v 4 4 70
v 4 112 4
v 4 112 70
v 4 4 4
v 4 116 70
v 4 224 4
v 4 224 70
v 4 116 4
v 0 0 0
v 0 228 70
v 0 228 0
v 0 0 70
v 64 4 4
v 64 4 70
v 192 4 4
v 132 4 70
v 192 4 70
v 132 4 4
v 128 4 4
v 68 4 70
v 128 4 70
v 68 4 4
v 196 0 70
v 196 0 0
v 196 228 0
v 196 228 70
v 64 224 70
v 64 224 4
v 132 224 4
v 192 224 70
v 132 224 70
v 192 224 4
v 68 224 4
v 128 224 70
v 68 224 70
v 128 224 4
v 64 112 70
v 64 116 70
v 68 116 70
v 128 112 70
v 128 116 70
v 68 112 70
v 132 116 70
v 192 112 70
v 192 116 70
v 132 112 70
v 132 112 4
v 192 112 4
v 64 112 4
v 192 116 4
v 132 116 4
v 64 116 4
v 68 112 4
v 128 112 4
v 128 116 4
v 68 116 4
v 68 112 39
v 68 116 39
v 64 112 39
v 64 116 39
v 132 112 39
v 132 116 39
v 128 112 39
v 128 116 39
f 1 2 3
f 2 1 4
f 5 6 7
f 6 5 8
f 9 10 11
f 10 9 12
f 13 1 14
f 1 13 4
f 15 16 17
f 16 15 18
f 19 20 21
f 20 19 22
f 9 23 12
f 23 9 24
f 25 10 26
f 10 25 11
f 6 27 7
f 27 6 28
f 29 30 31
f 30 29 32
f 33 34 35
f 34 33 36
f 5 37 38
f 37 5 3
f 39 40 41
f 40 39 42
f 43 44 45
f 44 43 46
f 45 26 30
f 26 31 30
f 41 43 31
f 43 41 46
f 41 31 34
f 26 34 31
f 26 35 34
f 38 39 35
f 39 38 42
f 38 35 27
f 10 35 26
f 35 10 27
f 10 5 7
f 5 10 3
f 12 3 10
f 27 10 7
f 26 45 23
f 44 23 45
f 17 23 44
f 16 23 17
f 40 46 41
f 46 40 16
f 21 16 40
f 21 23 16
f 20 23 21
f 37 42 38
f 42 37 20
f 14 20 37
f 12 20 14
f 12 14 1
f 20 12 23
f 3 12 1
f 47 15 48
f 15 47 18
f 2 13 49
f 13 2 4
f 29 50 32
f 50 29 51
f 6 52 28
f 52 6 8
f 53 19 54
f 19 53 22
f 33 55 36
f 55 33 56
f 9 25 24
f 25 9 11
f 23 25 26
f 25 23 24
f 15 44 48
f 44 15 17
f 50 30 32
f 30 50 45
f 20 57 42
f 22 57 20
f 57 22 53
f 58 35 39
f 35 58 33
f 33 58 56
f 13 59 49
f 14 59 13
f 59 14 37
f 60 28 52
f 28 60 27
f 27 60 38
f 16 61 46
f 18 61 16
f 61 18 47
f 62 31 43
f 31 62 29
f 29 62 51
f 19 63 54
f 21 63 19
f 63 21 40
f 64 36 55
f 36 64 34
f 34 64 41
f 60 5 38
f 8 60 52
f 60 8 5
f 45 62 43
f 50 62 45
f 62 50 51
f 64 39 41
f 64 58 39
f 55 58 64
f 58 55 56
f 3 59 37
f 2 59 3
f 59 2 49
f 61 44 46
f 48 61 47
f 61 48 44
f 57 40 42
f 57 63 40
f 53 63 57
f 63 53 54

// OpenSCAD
/*
This box with dividers thingie is suitable for both 3d printing and laser cutting.
Was made by Alexander Mangaard (aka Quixotic @ Thingiverse) sometime 2018.
Please support my coffee addiction @ https://www.paypal.me/AlexanderMangaard
*/

/*[Settings]*/

// Change to see how it looks assembled
View_Mode = "ASSEMBLED";  // ["ASSEMBLED":Assembled, "DISASSEMBLED":Disassembled]

// Do you want a bottom on the design?
has_bottom = "yes"; // [no:No, yes:Yes]

// Do you want a box?
has_box = "yes"; // [no:No, yes:Yes]

// Do you want dividers?
has_dividers = "yes"; // [no:No, yes:Yes]

//// Do you want divider stabilizers? Recommended when no box or bottom, but unnecessary otherwise.
//has_divider_stabilizers = "yes"; // [no:No, yes:Yes]

//(mm)
drawer_L = 196;     // drawer length
//(mm)
drawer_W = 228;     // drawer width
//(mm)
drawer_D = 70;      // drawer depth
//(mm)
material_W = 4;     // material width

// ternary operator sets z height for dividers in case there's a bottom. Needs to be lifted material_W.
zh = (has_bottom == "yes")
        ? material_W
        : 0;

num_horizontal_compartments = 3;
num_horizontal_div = 2+num_horizontal_compartments-1; // sides + internal div
num_vertical_compartments = 2;
num_vertical_div = 2+num_vertical_compartments-1; // sides + internal div

drawer_L_minus_div = drawer_L-(num_horizontal_div*material_W);
horizontal_compartment_width = drawer_L_minus_div/num_horizontal_compartments;
bottom_x_hole_width = horizontal_compartment_width/2;

drawer_W_minus_div = drawer_W-(num_vertical_div*material_W);
vertical_compartment_width = drawer_W_minus_div/num_vertical_compartments;
bottom_y_hole_width = vertical_compartment_width/2;

lasercut_mode = true;
include_gaps = true;

if (View_Mode == "ASSEMBLED") {
    if      (has_box == "no" && has_bottom == "yes" && has_dividers == "no") {
        bottom();
    }
    else if (has_box == "no" && has_bottom == "yes" && has_dividers == "yes") {

// top translate function for moving dividers
    translate([0,0,0]) {

dividers();
    // insert finger joints
    translate([material_W+bottom_x_hole_width/2,0,0])    bottom_x_axis_fingerjoints();

    // insert finger joints
    translate([0,material_W+bottom_y_hole_width/2,0])    bottom_y_axis_fingerjoints();
}

    //insert bottom
    translate([0,0,0]) { bottom(); }

}
    else if (has_box == "no" && has_bottom == "no" && has_dividers == "yes") {
        dividers();}
    else if (has_box == "yes" && has_bottom == "no" && has_dividers == "no") {
        outer_box();
    }
    else if (has_box == "yes" && has_bottom == "yes" && has_dividers == "no") {
        outer_box();
        bottom();
    }
    else if (has_box == "yes" && has_bottom == "no" && has_dividers == "yes") {
        dividers();
        translate([0,0,0]) {
        difference(){
        outer_box();
        // making holes for dividers
        for (i = [0 : num_horizontal_compartments-2])
        {
            if (num_vertical_compartments >=2) { //vertical_lineup num-2 creates "sides" when comp # set below 2
                vertical_lineup(num_vertical_compartments, (drawer_W-material_W)/num_vertical_compartments)
                { cube([drawer_L,material_W,drawer_D/2]);}
            }
            if (num_horizontal_compartments >=2) { //horizontal_lineup num-2 creates "sides" when comp # set below 2
                horizontal_lineup(num_horizontal_compartments, (drawer_L-material_W)/num_horizontal_compartments)
                { cube([material_W,drawer_W,drawer_D/2]);}
            }
        }
    }
}
    }
    else if (has_box == "yes" && has_bottom == "yes" && has_dividers == "yes") {
        difference(){
        translate([0,0,0]) outer_box();
        for (i = [0 : num_horizontal_compartments-2])
        {
            if (num_vertical_compartments >=2) { //vertical_lineup num-2 creates "sides" when comp # set below 2
            vertical_lineup(num_vertical_compartments, (drawer_W-material_W)/num_vertical_compartments)
            { cube([drawer_L,material_W,drawer_D/2]);}
        }
            if (num_horizontal_compartments >=2) { //vertical_lineup num-2 creates "sides" when comp # set below 2
            horizontal_lineup(num_horizontal_compartments, (drawer_L-material_W)/num_horizontal_compartments)
            { cube([material_W,drawer_W,drawer_D/2]);}
        }
        }
    }

    translate([0,0,0]) bottom();
    dividers();

    // insert finger joints
    translate([material_W+bottom_x_hole_width/2,0,0])    bottom_x_axis_fingerjoints();

    // insert finger joints
    translate([0,material_W+bottom_y_hole_width/2,0])    bottom_y_axis_fingerjoints();


    }

}

if (View_Mode == "DISASSEMBLED") {
  if      (has_box == "no" && has_bottom == "yes" && has_dividers == "no") {
          bottom_prone();
          }
  else if (has_box == "no" && has_bottom == "yes" && has_dividers == "yes") {
      dividers_prone();

        //insert bottom
        translate([4+drawer_L+drawer_W,0,0]) bottom_prone();
  }
  else if (has_box == "no" && has_bottom == "no" && has_dividers == "yes") {
      dividers_prone();
  }
  else if (has_box == "yes" && has_bottom == "no" && has_dividers == "no") {
      outer_box_prone();
  }
  else if (has_box == "yes" && has_bottom == "yes" && has_dividers == "no") {
      bottom_prone();
      translate([drawer_L+2,0,0]) outer_box_prone();
  }
  else if (has_box == "yes" && has_bottom == "no" && has_dividers == "yes") {
      dividers_prone();
      translate([drawer_L+drawer_W+2*2,0,0]) outer_box_prone();     

  }
  else if (has_box == "yes" && has_bottom == "yes" && has_dividers == "yes") {

        dividers_prone();
        translate([drawer_L*2+drawer_W+6,0,0]) outer_box_prone();
        //insert bottom
        translate([4+drawer_L+drawer_W,0,0]) bottom_prone();
    }
    }

//////////////////// Modules for assembled

module dividers() {
    if (num_horizontal_compartments >=2) { //horizontal_lineup num-2 creates "sides" when comp # set below 2
    translate([0,0,zh]) {
    ////insert dividers along y-axis
    difference(){
        horizontal_lineup(num_horizontal_compartments, (drawer_L-material_W)/num_horizontal_compartments)
        { cube([material_W,drawer_W,drawer_D-zh]); }
         if (num_vertical_compartments >=2) { // if # comps below 0 creates unwanted holes
            for (i = [0 : num_horizontal_compartments-2]) {
                vertical_lineup(num_vertical_compartments, (drawer_W-material_W)/num_vertical_compartments)
                    { cube([drawer_L,material_W,drawer_D/2]);}
    }}

    //add hole for slotting into box sides
    if (has_box == "yes") {
        for (i = [0 : num_horizontal_compartments-2]) {
            translate([0,0,drawer_D/2]) horizontal_lineup(
                num_horizontal_compartments, (drawer_L-material_W)/num_horizontal_compartments)
                { cube([material_W,material_W,drawer_D/2]);
                    translate([0,drawer_W-material_W,0]) cube([material_W,material_W,drawer_D/2]);}
    }}

    } }}

    //insert dividers along x-axis
    if (num_vertical_compartments >=2) { //vertical_lineup num-2 creates "sides" when comp # set below 2
    translate([0,0,zh])
        difference(){
            vertical_lineup(num_vertical_compartments, (drawer_W-material_W)/num_vertical_compartments)
            { cube([drawer_L, material_W,drawer_D-zh]);}
            if (num_horizontal_compartments >=2) { // if # comps below 0 creates unwanted holes
                for (i = [0 : num_horizontal_compartments-2]) {
                translate([0,0,drawer_D/2]) horizontal_lineup(
                    num_horizontal_compartments, (drawer_L-material_W)/num_horizontal_compartments)
                    { cube([material_W,drawer_W,drawer_D/2]);}
    }}


    translate([0,0,drawer_D/2]){
    //add hole for slotting into box sides
        if (has_box == "yes" && include_gaps == true) {
            for (i = [0 : num_horizontal_compartments-2]) {
                vertical_lineup(num_vertical_compartments, (drawer_W-material_W)/num_vertical_compartments)
                    { cube([material_W,material_W,drawer_D/2]);
                        translate([drawer_L-material_W,0,0]) cube([material_W,material_W,drawer_D/2]);}
    }}}}
}
    
  }
module outer_box() {
    translate([0,0,0]){
    //box side along y
    difference(){
    translate([0,0,zh]) cube([material_W, drawer_W, drawer_D-zh]);
    z_axis_fingerjoints();
    }
    // finger joints for connecting with bottom
    translate([0,material_W+vertical_compartment_width/2/2,0]) bottom_side_y_axis_fingerjoints();
    }

    //opposite box side along y
    translate([0,0,0]){
    difference(){
        translate([drawer_L-material_W, 0, zh]) cube([material_W, drawer_W, drawer_D-zh]);
        translate([drawer_L-material_W, 0,0]) z_axis_fingerjoints();
    }
    // finger joints for connecting with bottom
    translate([drawer_L-material_W,material_W+vertical_compartment_width/2/2,0]) bottom_side_y_axis_fingerjoints();
    }

   //sides along x
    translate([0,0,0]) {
    difference() {
        //combine two shapes for easier difference function
        union() {
        //box side along x
        translate([material_W,0,zh]) cube([drawer_L-material_W*2, material_W, drawer_D-zh]);
        //opposite box side along x
        translate([material_W,drawer_W-material_W, zh]) cube([drawer_L-material_W*2, material_W, drawer_D-zh]);
            //add finger joints to sides for fitting into bottom
            if (has_bottom == "yes")    {
                translate([material_W+bottom_x_hole_width/2,0,0]) bottom_side_x_axis_fingerjoints();
                translate([material_W+bottom_x_hole_width/2,drawer_W-material_W,0]) bottom_side_x_axis_fingerjoints();
              }
        }

    }
    // add finger joints to sides along x
        translate([0,0,0]) z_axis_fingerjoints();
        translate([drawer_L-material_W,0,0]) z_axis_fingerjoints();
}
}
module horizontal_lineup(num, space) { //div along y-axis
   // num-2 because we don't want overlap with outside box
   for (i = [0 : num-2])
       difference(){    translate([space+space*i, 0, 0 ]) children();
       }
   }
   
module horizontal_lineup_new(num, space) { //div along y-axis
   // num-2 because we don't want overlap with outside box

    for (i = [0 : num-2])
       difference(){    translate([space+space*i, 0, 0 ]) children();
       
   }
  
   }
module vertical_lineup(num, space) { //div along x-axis
    // num-2 because we don't want overlap with outside box
   for (i = [0 : num-2])
       difference(){    translate([0, space+space*i, 0 ]) children();   }}
module z_axis_fingerjoints() {
        for (i = [0: 1]) {
    translate([0,(drawer_W-material_W)*i,drawer_D/4/2])
        z_lineup(
        2, drawer_D/2)
            { cube([material_W, material_W, drawer_D/4]); }
            }}
module x_axis_fingerjoints() {
        for (i = [0: num_horizontal_compartments-1]) {
    translate([(material_W+horizontal_compartment_width)*i,0,0])
        vertical_lineup_prone(
        num_vertical_compartments, drawer_D+2)
            { square([bottom_x_hole_width, material_W]); }
            }}
module y_axis_fingerjoints() {
        for (i = [0: num_vertical_compartments-1]) {
        translate([(material_W+vertical_compartment_width)*i,drawer_D-material_W,0])
        vertical_lineup_prone(
        num_horizontal_compartments, (drawer_D+2))
            { square([bottom_y_hole_width, material_W]); }}
          }
module bottom() {

    if (include_gaps == true && has_box == "no" && has_dividers == "no") {
        cube([drawer_L, drawer_W, material_W]);
        }
    else if (include_gaps == true && has_box == "yes"){
        difference(){
        cube([drawer_L, drawer_W, material_W]);

    translate([0,0,0]) {
        //holes along y for box side finger joints
    translate([0,material_W+vertical_compartment_width/2/2,0]) bottom_side_y_axis_fingerjoints();
       translate([drawer_L-material_W,material_W+vertical_compartment_width/2/2,0]) bottom_side_y_axis_fingerjoints(); }
        //holes along y for box side finger joints
    translate([material_W+horizontal_compartment_width/2/2,0,0]) bottom_side_x_axis_fingerjoints();
         translate([material_W+horizontal_compartment_width/2/2,drawer_W-material_W,0]) bottom_side_x_axis_fingerjoints();
            }
        }
    else if (include_gaps == true && has_box == "yes" && has_dividers == "yes"){
    //TODO fix has box holes
    //// insert divider holes in bottom along y-axis
    difference(){
    cube([drawer_L, drawer_W, material_W]);
    translate([material_W+bottom_x_hole_width/2,0,0])   { bottom_x_axis_fingerjoints(); }
    translate([0,material_W+bottom_y_hole_width/2,0])   { bottom_y_axis_fingerjoints(); }
                }}

    else if (include_gaps == true && has_box == "no" && has_dividers == "yes"){
    //// insert divider holes in bottom along y-axis
    difference(){
    cube([drawer_L, drawer_W, material_W]);
    translate([material_W+bottom_x_hole_width/2,0,0])   { bottom_x_axis_fingerjoints(); }
    translate([0,material_W+bottom_y_hole_width/2,0])   { bottom_y_axis_fingerjoints(); }
                }}
                }
module bottom_x_axis_fingerjoints() {
        for (i = [0: num_horizontal_compartments-1]) {
    translate([(material_W+horizontal_compartment_width)*i,0,0])
        vertical_lineup(
        num_vertical_compartments, (drawer_W-material_W)/num_vertical_compartments)
            { cube([bottom_x_hole_width,material_W,material_W]); }
            }}
module bottom_side_x_axis_fingerjoints() {
        for (i = [0: num_horizontal_compartments-1]) {
    translate([(material_W+horizontal_compartment_width)*i,0,0])
        vertical_lineup_prone(
        2, (drawer_W-material_W)/num_vertical_compartments)
            { cube([bottom_x_hole_width,material_W,material_W]); }
            }}
module bottom_y_axis_fingerjoints() {
    //TODO: FIX THIS ... replace what is in bottom()
        for (i = [0: num_vertical_compartments-1]) {
    translate([0,(material_W+vertical_compartment_width)*i,0])
        horizontal_lineup(
        num_horizontal_compartments, (drawer_L-material_W)/num_horizontal_compartments)
            { cube([material_W,bottom_y_hole_width,material_W]); }
            }}
module bottom_side_y_axis_fingerjoints() {
    module z_lineup(num, space) { //div along y-axis
    // num-2 because we don't want overlap with outside box
    for (i = [0 : num-1])
       difference(){    translate([0, 0, space*i ]) children();   }}
            for (i = [0: num_vertical_compartments-1]) {
    translate([0,(material_W+vertical_compartment_width)*i,0])
        vertical_lineup_prone(
        2, (drawer_W-material_W)/num_vertical_compartments)
            { cube([material_W,vertical_compartment_width/2,material_W]);
               }
            }}


module z_lineup(num, space) { //div along y-axis
   // num-2 because we don't want overlap with outside box
   for (i = [0 : num-1])
       difference(){    translate([0, 0, space*i ]) children();   }}
//////////////////// Modules for disassembled

module outer_box_prone() {

    translate([0,0,0]) {                         //box side along y
    difference(){
    translate([0,zh,0]) rotate([0,0,0]) square([drawer_W, drawer_D-zh]);
    z_axis_fingerjoints_prone();
    
    if (has_dividers == "yes")    {
        if (num_vertical_compartments >=2) { // if # comps below 0 creates unwanted holes
        // make holes for fitting box sides into dividers
        horizontal_lineup(num_vertical_compartments, (drawer_W-material_W)/num_vertical_compartments)
        {square([material_W, drawer_D/2]);}
    }
    }
    }
    if (has_bottom == "yes")    {
        // finger joints for connecting with bottom
        translate([material_W+vertical_compartment_width/2/2,0,0]) bottom_side_y_axis_fingerjoints_prone();
    }   
    }
    
    translate([0,drawer_D+2,0]) {          //opposite box side along y
    difference(){
    translate([0,zh,0]) rotate([0,0,0]) square([drawer_W, drawer_D-zh]);
    z_axis_fingerjoints_prone();
    
    if (has_dividers == "yes")    {
        if (num_vertical_compartments >=2) { // if # comps below 0 creates unwanted holes
        // make holes for fitting box sides into dividers
        horizontal_lineup(num_vertical_compartments, (drawer_W-material_W)/num_vertical_compartments)
        {square([material_W, drawer_D/2]);}
    }
    }
        }
    if (has_bottom == "yes")    {
        // finger joints for connecting with bottom
        translate([material_W+vertical_compartment_width/2/2,0,0]) bottom_side_y_axis_fingerjoints_prone();
    }}
    
    translate([drawer_W+2,zh,0]) {             //box side
    difference(){
    square([drawer_L, drawer_D-zh]);

            //make room for finger joints
            square([material_W,drawer_W]);
            translate([drawer_L-material_W,0,0]) square([material_W,drawer_W]);
    
            if (has_dividers == "yes")    {
            if (num_horizontal_compartments >=2) { // if # comps below 0 creates unwanted holes
            // make holes for fitting box sides into dividers
            horizontal_lineup(num_horizontal_compartments, (drawer_L-material_W)/num_horizontal_compartments)
            {square([material_W, drawer_D/2-material_W]);}
            }
            }
        }
      
            if (has_bottom == "yes")    {
            // finger joints for connecting with bottom
            translate([material_W+bottom_x_hole_width/2,-zh,0]) bottom_side_x_axis_fingerjoints_prone();
    }
    
            //add finger joints to side along y
            translate([0,-zh,0]) z_axis_fingerjoints_prone2();
    }
        
    translate([drawer_W+2,drawer_D+2+zh,0]) {  //opposite box side
        difference(){
        square([drawer_L, drawer_D-zh]);

                //make room for finger joints
                square([material_W,drawer_W]);
                translate([drawer_L-material_W,0,0]) square([material_W,drawer_W]);
        
            if (has_dividers == "yes")    {
            if (num_horizontal_compartments >=2) { // if # comps below 0 creates unwanted holes
            // make holes for fitting box sides into dividers
            horizontal_lineup(num_horizontal_compartments, (drawer_L-material_W)/num_horizontal_compartments)
            {square([material_W, drawer_D/2-material_W]);}
            }
            }
            }
        
                    if (has_bottom == "yes")    {
                translate([material_W+bottom_x_hole_width/2,-zh,0]) bottom_side_x_axis_fingerjoints_prone();
        }        
                //add finger joints to side along x
                translate([0,-zh,0]) z_axis_fingerjoints_prone2();
    }
    
 }
module dividers_prone() {
        //insert prone div along x-axis
     if (num_vertical_compartments >=2) { // if # comps below 0 creates unwanted holes
        difference(){
        vertical_lineup_prone(num_vertical_compartments, drawer_D+2){ square([drawer_L,drawer_D]);}

         if (num_horizontal_compartments >=2) { // if # comps below 0 creates unwanted holes
            //insert gaps
                vertical_lineup_prone(num_vertical_compartments, drawer_D+2)
                { horizontal_lineup_prone(num_horizontal_compartments, (drawer_L-material_W)/num_horizontal_compartments)
                    {square([material_W,drawer_D/2]);
                    }}
        }

        if (has_bottom == "yes") {
            //remove bottom to make room for finger joint
            vertical_lineup_prone(num_vertical_compartments, drawer_D+2){square([drawer_L,material_W]);}
            }
            
            vertical_lineup_prone(num_vertical_compartments, drawer_D+2){
            if (has_box == "yes") {
            // add holes for fitting into box sides
            translate([0,drawer_D/2,0]) square([material_W,drawer_D/2]);
            translate([drawer_L-material_W,drawer_D/2,0]) square([material_W,drawer_D/2]);
            }}
        }
    }                
        
        if (has_bottom == "yes") {
            if (num_vertical_compartments >=2) { //when comp # set below 2 creates negative finger joints
            // insert finger joints
            translate([material_W+bottom_x_hole_width/2,0,0]) x_axis_fingerjoints();
            }

            // insert finger joints
            if (num_horizontal_compartments >=2) { //when comp # set below 2 creates negative finger joints
            translate([drawer_L+2+material_W+bottom_y_hole_width/2,0,0]) y_axis_fingerjoints();
            }
        }

        //insert prone div along y-axis
        if (num_horizontal_compartments >=2) { //horizontal_lineup num-2 creates "sides" when comp # set below 2                
        translate([drawer_L+2,0,0]) difference(){
        vertical_lineup_prone(num_horizontal_compartments, drawer_D+2){ square([drawer_W,drawer_D-zh]);}

         if (num_vertical_compartments >=2) { // if # comps below 0 creates unwanted holes
            //insert gaps
                vertical_lineup_prone(num_horizontal_compartments, drawer_D+2){
                   horizontal_lineup_prone(num_vertical_compartments, (drawer_W-material_W)/num_vertical_compartments)
                        {square([material_W,drawer_D/2]);
                    }}
        }
                    
//                     if (num_vertical_compartments >=2) { // if # comps below 0 creates unwanted holes
                    translate([0,0,0])
                    vertical_lineup_prone(num_horizontal_compartments, drawer_D+2){
                        if (has_box == "yes") {
                        // add holes for fitting into box sides
                        translate([0,0,0]) square([material_W,drawer_D/2]);
                        translate([drawer_W-material_W,0,0]) square([material_W,drawer_D/2]);
                        }}
//                    }
                    
                    }}
                    
                    }
module bottom_prone() {
    difference(){
    square([drawer_L, drawer_W]);
        if (has_dividers == "yes")    {
        if (num_vertical_compartments >=2) { //         
        translate([material_W+bottom_x_hole_width/2,0,0])   { bottom_x_axis_fingerjoints_prone(); }
        }
        if (num_horizontal_compartments >=2) { // no need for dividers if comp # 
        translate([0,material_W+bottom_y_hole_width/2,0])   { bottom_y_axis_fingerjoints_prone(); }
        }
}
    
    //finger joint holes for sides along x    
    if (has_box == "yes")    {
    translate([material_W+bottom_x_hole_width/2,0,0]) bottom_side_x_axis_fingerjoints_prone();
    translate([material_W+bottom_x_hole_width/2,drawer_W-material_W,0]) bottom_side_x_axis_fingerjoints_prone();
    
    //holes along y for box side finger joints
    translate([0,0+material_W+vertical_compartment_width/2/2,0]) bottom_side_y_axis_fingerjoints_prone2();
    translate([drawer_L-material_W,0+material_W+vertical_compartment_width/2/2,0]) bottom_side_y_axis_fingerjoints_prone2();
        }
}
}
                
module vertical_lineup_prone(num, space) {
    // num-2 because we don't want overlap with outside box
   for (i = [0 : num-2])
       difference(){    translate([0, space*i, 0 ]) children();         }}
module horizontal_lineup_prone(num, space) { //div along y-axis
   // num-2 because we don't want overlap with outside box
   for (i = [0 : num-2])
       difference(){    translate([space+space*i, 0, 0 ]) children();   }}
module z_lineup_prone(num, space) { //div along y-axis
   // num-2 because we don't want overlap with outside box
   for (i = [0 : num-1])
       difference(){    translate([0, space*i, 0]) children();   }}
module bottom_x_axis_fingerjoints_prone() {
        for (i = [0: num_horizontal_compartments-1]) {
    translate([(material_W+horizontal_compartment_width)*i,0,0])
        vertical_lineup(
        num_vertical_compartments, (drawer_W-material_W)/num_vertical_compartments)
            { square([bottom_x_hole_width,material_W]); }
            }}
module bottom_side_x_axis_fingerjoints_prone() {
        for (i = [0: num_horizontal_compartments-1]) {
    translate([(material_W+horizontal_compartment_width)*i,0,0])
        vertical_lineup_prone(
        2, (drawer_W-material_W)/num_vertical_compartments)
            { square([bottom_x_hole_width, material_W]); }
            }}
module bottom_y_axis_fingerjoints_prone() {
        for (i = [0: num_vertical_compartments-1]) {
    translate([0,(material_W+vertical_compartment_width)*i,0])
        horizontal_lineup(
        num_horizontal_compartments, (drawer_L-material_W)/num_horizontal_compartments)
            { square([material_W,bottom_y_hole_width]); }
            }}
module bottom_side_y_axis_fingerjoints_prone() {
    module z_lineup(num, space) { //div along y-axis
    // num-2 because we don't want overlap with outside box
    for (i = [0 : num-1])
       difference(){    translate([space*i, 0, 0]) children();   }}
            for (i = [0: num_vertical_compartments-1]) {
    translate([(material_W+vertical_compartment_width)*i,0,0])
        vertical_lineup_prone(
        2, (drawer_W-material_W)/num_vertical_compartments)
            { square([vertical_compartment_width/2,material_W]);
               }
            }}
module bottom_side_y_axis_fingerjoints_prone2() { //TODO: two similar modules, once must go
    module z_lineup(num, space) { //div along y-axis
    // num-2 because we don't want overlap with outside box
    for (i = [0 : num-1])
       difference(){    translate([space*i, 0, 0]) children();   }}
            for (i = [0: num_vertical_compartments-1]) {
    translate([0,(material_W+vertical_compartment_width)*i,0])
        vertical_lineup_prone(
        2, (drawer_W-material_W)/num_vertical_compartments)
            { square([material_W,vertical_compartment_width/2]);
               }
            }}
module z_axis_fingerjoints_prone() {
        for (i = [0: 1]) {
    translate([(drawer_W-material_W)*i,drawer_D/4/2,0])
        z_lineup_prone(
        2, drawer_D/2)
            { square([material_W, drawer_D/4]); }
            }}
module z_axis_fingerjoints_prone2() {
        for (i = [0: 1]) {
    translate([(drawer_L-material_W)*i,drawer_D/4/2,0])
        z_lineup_prone(
        2, drawer_D/2)
            { square([material_W, drawer_D/4]); }
            }}
